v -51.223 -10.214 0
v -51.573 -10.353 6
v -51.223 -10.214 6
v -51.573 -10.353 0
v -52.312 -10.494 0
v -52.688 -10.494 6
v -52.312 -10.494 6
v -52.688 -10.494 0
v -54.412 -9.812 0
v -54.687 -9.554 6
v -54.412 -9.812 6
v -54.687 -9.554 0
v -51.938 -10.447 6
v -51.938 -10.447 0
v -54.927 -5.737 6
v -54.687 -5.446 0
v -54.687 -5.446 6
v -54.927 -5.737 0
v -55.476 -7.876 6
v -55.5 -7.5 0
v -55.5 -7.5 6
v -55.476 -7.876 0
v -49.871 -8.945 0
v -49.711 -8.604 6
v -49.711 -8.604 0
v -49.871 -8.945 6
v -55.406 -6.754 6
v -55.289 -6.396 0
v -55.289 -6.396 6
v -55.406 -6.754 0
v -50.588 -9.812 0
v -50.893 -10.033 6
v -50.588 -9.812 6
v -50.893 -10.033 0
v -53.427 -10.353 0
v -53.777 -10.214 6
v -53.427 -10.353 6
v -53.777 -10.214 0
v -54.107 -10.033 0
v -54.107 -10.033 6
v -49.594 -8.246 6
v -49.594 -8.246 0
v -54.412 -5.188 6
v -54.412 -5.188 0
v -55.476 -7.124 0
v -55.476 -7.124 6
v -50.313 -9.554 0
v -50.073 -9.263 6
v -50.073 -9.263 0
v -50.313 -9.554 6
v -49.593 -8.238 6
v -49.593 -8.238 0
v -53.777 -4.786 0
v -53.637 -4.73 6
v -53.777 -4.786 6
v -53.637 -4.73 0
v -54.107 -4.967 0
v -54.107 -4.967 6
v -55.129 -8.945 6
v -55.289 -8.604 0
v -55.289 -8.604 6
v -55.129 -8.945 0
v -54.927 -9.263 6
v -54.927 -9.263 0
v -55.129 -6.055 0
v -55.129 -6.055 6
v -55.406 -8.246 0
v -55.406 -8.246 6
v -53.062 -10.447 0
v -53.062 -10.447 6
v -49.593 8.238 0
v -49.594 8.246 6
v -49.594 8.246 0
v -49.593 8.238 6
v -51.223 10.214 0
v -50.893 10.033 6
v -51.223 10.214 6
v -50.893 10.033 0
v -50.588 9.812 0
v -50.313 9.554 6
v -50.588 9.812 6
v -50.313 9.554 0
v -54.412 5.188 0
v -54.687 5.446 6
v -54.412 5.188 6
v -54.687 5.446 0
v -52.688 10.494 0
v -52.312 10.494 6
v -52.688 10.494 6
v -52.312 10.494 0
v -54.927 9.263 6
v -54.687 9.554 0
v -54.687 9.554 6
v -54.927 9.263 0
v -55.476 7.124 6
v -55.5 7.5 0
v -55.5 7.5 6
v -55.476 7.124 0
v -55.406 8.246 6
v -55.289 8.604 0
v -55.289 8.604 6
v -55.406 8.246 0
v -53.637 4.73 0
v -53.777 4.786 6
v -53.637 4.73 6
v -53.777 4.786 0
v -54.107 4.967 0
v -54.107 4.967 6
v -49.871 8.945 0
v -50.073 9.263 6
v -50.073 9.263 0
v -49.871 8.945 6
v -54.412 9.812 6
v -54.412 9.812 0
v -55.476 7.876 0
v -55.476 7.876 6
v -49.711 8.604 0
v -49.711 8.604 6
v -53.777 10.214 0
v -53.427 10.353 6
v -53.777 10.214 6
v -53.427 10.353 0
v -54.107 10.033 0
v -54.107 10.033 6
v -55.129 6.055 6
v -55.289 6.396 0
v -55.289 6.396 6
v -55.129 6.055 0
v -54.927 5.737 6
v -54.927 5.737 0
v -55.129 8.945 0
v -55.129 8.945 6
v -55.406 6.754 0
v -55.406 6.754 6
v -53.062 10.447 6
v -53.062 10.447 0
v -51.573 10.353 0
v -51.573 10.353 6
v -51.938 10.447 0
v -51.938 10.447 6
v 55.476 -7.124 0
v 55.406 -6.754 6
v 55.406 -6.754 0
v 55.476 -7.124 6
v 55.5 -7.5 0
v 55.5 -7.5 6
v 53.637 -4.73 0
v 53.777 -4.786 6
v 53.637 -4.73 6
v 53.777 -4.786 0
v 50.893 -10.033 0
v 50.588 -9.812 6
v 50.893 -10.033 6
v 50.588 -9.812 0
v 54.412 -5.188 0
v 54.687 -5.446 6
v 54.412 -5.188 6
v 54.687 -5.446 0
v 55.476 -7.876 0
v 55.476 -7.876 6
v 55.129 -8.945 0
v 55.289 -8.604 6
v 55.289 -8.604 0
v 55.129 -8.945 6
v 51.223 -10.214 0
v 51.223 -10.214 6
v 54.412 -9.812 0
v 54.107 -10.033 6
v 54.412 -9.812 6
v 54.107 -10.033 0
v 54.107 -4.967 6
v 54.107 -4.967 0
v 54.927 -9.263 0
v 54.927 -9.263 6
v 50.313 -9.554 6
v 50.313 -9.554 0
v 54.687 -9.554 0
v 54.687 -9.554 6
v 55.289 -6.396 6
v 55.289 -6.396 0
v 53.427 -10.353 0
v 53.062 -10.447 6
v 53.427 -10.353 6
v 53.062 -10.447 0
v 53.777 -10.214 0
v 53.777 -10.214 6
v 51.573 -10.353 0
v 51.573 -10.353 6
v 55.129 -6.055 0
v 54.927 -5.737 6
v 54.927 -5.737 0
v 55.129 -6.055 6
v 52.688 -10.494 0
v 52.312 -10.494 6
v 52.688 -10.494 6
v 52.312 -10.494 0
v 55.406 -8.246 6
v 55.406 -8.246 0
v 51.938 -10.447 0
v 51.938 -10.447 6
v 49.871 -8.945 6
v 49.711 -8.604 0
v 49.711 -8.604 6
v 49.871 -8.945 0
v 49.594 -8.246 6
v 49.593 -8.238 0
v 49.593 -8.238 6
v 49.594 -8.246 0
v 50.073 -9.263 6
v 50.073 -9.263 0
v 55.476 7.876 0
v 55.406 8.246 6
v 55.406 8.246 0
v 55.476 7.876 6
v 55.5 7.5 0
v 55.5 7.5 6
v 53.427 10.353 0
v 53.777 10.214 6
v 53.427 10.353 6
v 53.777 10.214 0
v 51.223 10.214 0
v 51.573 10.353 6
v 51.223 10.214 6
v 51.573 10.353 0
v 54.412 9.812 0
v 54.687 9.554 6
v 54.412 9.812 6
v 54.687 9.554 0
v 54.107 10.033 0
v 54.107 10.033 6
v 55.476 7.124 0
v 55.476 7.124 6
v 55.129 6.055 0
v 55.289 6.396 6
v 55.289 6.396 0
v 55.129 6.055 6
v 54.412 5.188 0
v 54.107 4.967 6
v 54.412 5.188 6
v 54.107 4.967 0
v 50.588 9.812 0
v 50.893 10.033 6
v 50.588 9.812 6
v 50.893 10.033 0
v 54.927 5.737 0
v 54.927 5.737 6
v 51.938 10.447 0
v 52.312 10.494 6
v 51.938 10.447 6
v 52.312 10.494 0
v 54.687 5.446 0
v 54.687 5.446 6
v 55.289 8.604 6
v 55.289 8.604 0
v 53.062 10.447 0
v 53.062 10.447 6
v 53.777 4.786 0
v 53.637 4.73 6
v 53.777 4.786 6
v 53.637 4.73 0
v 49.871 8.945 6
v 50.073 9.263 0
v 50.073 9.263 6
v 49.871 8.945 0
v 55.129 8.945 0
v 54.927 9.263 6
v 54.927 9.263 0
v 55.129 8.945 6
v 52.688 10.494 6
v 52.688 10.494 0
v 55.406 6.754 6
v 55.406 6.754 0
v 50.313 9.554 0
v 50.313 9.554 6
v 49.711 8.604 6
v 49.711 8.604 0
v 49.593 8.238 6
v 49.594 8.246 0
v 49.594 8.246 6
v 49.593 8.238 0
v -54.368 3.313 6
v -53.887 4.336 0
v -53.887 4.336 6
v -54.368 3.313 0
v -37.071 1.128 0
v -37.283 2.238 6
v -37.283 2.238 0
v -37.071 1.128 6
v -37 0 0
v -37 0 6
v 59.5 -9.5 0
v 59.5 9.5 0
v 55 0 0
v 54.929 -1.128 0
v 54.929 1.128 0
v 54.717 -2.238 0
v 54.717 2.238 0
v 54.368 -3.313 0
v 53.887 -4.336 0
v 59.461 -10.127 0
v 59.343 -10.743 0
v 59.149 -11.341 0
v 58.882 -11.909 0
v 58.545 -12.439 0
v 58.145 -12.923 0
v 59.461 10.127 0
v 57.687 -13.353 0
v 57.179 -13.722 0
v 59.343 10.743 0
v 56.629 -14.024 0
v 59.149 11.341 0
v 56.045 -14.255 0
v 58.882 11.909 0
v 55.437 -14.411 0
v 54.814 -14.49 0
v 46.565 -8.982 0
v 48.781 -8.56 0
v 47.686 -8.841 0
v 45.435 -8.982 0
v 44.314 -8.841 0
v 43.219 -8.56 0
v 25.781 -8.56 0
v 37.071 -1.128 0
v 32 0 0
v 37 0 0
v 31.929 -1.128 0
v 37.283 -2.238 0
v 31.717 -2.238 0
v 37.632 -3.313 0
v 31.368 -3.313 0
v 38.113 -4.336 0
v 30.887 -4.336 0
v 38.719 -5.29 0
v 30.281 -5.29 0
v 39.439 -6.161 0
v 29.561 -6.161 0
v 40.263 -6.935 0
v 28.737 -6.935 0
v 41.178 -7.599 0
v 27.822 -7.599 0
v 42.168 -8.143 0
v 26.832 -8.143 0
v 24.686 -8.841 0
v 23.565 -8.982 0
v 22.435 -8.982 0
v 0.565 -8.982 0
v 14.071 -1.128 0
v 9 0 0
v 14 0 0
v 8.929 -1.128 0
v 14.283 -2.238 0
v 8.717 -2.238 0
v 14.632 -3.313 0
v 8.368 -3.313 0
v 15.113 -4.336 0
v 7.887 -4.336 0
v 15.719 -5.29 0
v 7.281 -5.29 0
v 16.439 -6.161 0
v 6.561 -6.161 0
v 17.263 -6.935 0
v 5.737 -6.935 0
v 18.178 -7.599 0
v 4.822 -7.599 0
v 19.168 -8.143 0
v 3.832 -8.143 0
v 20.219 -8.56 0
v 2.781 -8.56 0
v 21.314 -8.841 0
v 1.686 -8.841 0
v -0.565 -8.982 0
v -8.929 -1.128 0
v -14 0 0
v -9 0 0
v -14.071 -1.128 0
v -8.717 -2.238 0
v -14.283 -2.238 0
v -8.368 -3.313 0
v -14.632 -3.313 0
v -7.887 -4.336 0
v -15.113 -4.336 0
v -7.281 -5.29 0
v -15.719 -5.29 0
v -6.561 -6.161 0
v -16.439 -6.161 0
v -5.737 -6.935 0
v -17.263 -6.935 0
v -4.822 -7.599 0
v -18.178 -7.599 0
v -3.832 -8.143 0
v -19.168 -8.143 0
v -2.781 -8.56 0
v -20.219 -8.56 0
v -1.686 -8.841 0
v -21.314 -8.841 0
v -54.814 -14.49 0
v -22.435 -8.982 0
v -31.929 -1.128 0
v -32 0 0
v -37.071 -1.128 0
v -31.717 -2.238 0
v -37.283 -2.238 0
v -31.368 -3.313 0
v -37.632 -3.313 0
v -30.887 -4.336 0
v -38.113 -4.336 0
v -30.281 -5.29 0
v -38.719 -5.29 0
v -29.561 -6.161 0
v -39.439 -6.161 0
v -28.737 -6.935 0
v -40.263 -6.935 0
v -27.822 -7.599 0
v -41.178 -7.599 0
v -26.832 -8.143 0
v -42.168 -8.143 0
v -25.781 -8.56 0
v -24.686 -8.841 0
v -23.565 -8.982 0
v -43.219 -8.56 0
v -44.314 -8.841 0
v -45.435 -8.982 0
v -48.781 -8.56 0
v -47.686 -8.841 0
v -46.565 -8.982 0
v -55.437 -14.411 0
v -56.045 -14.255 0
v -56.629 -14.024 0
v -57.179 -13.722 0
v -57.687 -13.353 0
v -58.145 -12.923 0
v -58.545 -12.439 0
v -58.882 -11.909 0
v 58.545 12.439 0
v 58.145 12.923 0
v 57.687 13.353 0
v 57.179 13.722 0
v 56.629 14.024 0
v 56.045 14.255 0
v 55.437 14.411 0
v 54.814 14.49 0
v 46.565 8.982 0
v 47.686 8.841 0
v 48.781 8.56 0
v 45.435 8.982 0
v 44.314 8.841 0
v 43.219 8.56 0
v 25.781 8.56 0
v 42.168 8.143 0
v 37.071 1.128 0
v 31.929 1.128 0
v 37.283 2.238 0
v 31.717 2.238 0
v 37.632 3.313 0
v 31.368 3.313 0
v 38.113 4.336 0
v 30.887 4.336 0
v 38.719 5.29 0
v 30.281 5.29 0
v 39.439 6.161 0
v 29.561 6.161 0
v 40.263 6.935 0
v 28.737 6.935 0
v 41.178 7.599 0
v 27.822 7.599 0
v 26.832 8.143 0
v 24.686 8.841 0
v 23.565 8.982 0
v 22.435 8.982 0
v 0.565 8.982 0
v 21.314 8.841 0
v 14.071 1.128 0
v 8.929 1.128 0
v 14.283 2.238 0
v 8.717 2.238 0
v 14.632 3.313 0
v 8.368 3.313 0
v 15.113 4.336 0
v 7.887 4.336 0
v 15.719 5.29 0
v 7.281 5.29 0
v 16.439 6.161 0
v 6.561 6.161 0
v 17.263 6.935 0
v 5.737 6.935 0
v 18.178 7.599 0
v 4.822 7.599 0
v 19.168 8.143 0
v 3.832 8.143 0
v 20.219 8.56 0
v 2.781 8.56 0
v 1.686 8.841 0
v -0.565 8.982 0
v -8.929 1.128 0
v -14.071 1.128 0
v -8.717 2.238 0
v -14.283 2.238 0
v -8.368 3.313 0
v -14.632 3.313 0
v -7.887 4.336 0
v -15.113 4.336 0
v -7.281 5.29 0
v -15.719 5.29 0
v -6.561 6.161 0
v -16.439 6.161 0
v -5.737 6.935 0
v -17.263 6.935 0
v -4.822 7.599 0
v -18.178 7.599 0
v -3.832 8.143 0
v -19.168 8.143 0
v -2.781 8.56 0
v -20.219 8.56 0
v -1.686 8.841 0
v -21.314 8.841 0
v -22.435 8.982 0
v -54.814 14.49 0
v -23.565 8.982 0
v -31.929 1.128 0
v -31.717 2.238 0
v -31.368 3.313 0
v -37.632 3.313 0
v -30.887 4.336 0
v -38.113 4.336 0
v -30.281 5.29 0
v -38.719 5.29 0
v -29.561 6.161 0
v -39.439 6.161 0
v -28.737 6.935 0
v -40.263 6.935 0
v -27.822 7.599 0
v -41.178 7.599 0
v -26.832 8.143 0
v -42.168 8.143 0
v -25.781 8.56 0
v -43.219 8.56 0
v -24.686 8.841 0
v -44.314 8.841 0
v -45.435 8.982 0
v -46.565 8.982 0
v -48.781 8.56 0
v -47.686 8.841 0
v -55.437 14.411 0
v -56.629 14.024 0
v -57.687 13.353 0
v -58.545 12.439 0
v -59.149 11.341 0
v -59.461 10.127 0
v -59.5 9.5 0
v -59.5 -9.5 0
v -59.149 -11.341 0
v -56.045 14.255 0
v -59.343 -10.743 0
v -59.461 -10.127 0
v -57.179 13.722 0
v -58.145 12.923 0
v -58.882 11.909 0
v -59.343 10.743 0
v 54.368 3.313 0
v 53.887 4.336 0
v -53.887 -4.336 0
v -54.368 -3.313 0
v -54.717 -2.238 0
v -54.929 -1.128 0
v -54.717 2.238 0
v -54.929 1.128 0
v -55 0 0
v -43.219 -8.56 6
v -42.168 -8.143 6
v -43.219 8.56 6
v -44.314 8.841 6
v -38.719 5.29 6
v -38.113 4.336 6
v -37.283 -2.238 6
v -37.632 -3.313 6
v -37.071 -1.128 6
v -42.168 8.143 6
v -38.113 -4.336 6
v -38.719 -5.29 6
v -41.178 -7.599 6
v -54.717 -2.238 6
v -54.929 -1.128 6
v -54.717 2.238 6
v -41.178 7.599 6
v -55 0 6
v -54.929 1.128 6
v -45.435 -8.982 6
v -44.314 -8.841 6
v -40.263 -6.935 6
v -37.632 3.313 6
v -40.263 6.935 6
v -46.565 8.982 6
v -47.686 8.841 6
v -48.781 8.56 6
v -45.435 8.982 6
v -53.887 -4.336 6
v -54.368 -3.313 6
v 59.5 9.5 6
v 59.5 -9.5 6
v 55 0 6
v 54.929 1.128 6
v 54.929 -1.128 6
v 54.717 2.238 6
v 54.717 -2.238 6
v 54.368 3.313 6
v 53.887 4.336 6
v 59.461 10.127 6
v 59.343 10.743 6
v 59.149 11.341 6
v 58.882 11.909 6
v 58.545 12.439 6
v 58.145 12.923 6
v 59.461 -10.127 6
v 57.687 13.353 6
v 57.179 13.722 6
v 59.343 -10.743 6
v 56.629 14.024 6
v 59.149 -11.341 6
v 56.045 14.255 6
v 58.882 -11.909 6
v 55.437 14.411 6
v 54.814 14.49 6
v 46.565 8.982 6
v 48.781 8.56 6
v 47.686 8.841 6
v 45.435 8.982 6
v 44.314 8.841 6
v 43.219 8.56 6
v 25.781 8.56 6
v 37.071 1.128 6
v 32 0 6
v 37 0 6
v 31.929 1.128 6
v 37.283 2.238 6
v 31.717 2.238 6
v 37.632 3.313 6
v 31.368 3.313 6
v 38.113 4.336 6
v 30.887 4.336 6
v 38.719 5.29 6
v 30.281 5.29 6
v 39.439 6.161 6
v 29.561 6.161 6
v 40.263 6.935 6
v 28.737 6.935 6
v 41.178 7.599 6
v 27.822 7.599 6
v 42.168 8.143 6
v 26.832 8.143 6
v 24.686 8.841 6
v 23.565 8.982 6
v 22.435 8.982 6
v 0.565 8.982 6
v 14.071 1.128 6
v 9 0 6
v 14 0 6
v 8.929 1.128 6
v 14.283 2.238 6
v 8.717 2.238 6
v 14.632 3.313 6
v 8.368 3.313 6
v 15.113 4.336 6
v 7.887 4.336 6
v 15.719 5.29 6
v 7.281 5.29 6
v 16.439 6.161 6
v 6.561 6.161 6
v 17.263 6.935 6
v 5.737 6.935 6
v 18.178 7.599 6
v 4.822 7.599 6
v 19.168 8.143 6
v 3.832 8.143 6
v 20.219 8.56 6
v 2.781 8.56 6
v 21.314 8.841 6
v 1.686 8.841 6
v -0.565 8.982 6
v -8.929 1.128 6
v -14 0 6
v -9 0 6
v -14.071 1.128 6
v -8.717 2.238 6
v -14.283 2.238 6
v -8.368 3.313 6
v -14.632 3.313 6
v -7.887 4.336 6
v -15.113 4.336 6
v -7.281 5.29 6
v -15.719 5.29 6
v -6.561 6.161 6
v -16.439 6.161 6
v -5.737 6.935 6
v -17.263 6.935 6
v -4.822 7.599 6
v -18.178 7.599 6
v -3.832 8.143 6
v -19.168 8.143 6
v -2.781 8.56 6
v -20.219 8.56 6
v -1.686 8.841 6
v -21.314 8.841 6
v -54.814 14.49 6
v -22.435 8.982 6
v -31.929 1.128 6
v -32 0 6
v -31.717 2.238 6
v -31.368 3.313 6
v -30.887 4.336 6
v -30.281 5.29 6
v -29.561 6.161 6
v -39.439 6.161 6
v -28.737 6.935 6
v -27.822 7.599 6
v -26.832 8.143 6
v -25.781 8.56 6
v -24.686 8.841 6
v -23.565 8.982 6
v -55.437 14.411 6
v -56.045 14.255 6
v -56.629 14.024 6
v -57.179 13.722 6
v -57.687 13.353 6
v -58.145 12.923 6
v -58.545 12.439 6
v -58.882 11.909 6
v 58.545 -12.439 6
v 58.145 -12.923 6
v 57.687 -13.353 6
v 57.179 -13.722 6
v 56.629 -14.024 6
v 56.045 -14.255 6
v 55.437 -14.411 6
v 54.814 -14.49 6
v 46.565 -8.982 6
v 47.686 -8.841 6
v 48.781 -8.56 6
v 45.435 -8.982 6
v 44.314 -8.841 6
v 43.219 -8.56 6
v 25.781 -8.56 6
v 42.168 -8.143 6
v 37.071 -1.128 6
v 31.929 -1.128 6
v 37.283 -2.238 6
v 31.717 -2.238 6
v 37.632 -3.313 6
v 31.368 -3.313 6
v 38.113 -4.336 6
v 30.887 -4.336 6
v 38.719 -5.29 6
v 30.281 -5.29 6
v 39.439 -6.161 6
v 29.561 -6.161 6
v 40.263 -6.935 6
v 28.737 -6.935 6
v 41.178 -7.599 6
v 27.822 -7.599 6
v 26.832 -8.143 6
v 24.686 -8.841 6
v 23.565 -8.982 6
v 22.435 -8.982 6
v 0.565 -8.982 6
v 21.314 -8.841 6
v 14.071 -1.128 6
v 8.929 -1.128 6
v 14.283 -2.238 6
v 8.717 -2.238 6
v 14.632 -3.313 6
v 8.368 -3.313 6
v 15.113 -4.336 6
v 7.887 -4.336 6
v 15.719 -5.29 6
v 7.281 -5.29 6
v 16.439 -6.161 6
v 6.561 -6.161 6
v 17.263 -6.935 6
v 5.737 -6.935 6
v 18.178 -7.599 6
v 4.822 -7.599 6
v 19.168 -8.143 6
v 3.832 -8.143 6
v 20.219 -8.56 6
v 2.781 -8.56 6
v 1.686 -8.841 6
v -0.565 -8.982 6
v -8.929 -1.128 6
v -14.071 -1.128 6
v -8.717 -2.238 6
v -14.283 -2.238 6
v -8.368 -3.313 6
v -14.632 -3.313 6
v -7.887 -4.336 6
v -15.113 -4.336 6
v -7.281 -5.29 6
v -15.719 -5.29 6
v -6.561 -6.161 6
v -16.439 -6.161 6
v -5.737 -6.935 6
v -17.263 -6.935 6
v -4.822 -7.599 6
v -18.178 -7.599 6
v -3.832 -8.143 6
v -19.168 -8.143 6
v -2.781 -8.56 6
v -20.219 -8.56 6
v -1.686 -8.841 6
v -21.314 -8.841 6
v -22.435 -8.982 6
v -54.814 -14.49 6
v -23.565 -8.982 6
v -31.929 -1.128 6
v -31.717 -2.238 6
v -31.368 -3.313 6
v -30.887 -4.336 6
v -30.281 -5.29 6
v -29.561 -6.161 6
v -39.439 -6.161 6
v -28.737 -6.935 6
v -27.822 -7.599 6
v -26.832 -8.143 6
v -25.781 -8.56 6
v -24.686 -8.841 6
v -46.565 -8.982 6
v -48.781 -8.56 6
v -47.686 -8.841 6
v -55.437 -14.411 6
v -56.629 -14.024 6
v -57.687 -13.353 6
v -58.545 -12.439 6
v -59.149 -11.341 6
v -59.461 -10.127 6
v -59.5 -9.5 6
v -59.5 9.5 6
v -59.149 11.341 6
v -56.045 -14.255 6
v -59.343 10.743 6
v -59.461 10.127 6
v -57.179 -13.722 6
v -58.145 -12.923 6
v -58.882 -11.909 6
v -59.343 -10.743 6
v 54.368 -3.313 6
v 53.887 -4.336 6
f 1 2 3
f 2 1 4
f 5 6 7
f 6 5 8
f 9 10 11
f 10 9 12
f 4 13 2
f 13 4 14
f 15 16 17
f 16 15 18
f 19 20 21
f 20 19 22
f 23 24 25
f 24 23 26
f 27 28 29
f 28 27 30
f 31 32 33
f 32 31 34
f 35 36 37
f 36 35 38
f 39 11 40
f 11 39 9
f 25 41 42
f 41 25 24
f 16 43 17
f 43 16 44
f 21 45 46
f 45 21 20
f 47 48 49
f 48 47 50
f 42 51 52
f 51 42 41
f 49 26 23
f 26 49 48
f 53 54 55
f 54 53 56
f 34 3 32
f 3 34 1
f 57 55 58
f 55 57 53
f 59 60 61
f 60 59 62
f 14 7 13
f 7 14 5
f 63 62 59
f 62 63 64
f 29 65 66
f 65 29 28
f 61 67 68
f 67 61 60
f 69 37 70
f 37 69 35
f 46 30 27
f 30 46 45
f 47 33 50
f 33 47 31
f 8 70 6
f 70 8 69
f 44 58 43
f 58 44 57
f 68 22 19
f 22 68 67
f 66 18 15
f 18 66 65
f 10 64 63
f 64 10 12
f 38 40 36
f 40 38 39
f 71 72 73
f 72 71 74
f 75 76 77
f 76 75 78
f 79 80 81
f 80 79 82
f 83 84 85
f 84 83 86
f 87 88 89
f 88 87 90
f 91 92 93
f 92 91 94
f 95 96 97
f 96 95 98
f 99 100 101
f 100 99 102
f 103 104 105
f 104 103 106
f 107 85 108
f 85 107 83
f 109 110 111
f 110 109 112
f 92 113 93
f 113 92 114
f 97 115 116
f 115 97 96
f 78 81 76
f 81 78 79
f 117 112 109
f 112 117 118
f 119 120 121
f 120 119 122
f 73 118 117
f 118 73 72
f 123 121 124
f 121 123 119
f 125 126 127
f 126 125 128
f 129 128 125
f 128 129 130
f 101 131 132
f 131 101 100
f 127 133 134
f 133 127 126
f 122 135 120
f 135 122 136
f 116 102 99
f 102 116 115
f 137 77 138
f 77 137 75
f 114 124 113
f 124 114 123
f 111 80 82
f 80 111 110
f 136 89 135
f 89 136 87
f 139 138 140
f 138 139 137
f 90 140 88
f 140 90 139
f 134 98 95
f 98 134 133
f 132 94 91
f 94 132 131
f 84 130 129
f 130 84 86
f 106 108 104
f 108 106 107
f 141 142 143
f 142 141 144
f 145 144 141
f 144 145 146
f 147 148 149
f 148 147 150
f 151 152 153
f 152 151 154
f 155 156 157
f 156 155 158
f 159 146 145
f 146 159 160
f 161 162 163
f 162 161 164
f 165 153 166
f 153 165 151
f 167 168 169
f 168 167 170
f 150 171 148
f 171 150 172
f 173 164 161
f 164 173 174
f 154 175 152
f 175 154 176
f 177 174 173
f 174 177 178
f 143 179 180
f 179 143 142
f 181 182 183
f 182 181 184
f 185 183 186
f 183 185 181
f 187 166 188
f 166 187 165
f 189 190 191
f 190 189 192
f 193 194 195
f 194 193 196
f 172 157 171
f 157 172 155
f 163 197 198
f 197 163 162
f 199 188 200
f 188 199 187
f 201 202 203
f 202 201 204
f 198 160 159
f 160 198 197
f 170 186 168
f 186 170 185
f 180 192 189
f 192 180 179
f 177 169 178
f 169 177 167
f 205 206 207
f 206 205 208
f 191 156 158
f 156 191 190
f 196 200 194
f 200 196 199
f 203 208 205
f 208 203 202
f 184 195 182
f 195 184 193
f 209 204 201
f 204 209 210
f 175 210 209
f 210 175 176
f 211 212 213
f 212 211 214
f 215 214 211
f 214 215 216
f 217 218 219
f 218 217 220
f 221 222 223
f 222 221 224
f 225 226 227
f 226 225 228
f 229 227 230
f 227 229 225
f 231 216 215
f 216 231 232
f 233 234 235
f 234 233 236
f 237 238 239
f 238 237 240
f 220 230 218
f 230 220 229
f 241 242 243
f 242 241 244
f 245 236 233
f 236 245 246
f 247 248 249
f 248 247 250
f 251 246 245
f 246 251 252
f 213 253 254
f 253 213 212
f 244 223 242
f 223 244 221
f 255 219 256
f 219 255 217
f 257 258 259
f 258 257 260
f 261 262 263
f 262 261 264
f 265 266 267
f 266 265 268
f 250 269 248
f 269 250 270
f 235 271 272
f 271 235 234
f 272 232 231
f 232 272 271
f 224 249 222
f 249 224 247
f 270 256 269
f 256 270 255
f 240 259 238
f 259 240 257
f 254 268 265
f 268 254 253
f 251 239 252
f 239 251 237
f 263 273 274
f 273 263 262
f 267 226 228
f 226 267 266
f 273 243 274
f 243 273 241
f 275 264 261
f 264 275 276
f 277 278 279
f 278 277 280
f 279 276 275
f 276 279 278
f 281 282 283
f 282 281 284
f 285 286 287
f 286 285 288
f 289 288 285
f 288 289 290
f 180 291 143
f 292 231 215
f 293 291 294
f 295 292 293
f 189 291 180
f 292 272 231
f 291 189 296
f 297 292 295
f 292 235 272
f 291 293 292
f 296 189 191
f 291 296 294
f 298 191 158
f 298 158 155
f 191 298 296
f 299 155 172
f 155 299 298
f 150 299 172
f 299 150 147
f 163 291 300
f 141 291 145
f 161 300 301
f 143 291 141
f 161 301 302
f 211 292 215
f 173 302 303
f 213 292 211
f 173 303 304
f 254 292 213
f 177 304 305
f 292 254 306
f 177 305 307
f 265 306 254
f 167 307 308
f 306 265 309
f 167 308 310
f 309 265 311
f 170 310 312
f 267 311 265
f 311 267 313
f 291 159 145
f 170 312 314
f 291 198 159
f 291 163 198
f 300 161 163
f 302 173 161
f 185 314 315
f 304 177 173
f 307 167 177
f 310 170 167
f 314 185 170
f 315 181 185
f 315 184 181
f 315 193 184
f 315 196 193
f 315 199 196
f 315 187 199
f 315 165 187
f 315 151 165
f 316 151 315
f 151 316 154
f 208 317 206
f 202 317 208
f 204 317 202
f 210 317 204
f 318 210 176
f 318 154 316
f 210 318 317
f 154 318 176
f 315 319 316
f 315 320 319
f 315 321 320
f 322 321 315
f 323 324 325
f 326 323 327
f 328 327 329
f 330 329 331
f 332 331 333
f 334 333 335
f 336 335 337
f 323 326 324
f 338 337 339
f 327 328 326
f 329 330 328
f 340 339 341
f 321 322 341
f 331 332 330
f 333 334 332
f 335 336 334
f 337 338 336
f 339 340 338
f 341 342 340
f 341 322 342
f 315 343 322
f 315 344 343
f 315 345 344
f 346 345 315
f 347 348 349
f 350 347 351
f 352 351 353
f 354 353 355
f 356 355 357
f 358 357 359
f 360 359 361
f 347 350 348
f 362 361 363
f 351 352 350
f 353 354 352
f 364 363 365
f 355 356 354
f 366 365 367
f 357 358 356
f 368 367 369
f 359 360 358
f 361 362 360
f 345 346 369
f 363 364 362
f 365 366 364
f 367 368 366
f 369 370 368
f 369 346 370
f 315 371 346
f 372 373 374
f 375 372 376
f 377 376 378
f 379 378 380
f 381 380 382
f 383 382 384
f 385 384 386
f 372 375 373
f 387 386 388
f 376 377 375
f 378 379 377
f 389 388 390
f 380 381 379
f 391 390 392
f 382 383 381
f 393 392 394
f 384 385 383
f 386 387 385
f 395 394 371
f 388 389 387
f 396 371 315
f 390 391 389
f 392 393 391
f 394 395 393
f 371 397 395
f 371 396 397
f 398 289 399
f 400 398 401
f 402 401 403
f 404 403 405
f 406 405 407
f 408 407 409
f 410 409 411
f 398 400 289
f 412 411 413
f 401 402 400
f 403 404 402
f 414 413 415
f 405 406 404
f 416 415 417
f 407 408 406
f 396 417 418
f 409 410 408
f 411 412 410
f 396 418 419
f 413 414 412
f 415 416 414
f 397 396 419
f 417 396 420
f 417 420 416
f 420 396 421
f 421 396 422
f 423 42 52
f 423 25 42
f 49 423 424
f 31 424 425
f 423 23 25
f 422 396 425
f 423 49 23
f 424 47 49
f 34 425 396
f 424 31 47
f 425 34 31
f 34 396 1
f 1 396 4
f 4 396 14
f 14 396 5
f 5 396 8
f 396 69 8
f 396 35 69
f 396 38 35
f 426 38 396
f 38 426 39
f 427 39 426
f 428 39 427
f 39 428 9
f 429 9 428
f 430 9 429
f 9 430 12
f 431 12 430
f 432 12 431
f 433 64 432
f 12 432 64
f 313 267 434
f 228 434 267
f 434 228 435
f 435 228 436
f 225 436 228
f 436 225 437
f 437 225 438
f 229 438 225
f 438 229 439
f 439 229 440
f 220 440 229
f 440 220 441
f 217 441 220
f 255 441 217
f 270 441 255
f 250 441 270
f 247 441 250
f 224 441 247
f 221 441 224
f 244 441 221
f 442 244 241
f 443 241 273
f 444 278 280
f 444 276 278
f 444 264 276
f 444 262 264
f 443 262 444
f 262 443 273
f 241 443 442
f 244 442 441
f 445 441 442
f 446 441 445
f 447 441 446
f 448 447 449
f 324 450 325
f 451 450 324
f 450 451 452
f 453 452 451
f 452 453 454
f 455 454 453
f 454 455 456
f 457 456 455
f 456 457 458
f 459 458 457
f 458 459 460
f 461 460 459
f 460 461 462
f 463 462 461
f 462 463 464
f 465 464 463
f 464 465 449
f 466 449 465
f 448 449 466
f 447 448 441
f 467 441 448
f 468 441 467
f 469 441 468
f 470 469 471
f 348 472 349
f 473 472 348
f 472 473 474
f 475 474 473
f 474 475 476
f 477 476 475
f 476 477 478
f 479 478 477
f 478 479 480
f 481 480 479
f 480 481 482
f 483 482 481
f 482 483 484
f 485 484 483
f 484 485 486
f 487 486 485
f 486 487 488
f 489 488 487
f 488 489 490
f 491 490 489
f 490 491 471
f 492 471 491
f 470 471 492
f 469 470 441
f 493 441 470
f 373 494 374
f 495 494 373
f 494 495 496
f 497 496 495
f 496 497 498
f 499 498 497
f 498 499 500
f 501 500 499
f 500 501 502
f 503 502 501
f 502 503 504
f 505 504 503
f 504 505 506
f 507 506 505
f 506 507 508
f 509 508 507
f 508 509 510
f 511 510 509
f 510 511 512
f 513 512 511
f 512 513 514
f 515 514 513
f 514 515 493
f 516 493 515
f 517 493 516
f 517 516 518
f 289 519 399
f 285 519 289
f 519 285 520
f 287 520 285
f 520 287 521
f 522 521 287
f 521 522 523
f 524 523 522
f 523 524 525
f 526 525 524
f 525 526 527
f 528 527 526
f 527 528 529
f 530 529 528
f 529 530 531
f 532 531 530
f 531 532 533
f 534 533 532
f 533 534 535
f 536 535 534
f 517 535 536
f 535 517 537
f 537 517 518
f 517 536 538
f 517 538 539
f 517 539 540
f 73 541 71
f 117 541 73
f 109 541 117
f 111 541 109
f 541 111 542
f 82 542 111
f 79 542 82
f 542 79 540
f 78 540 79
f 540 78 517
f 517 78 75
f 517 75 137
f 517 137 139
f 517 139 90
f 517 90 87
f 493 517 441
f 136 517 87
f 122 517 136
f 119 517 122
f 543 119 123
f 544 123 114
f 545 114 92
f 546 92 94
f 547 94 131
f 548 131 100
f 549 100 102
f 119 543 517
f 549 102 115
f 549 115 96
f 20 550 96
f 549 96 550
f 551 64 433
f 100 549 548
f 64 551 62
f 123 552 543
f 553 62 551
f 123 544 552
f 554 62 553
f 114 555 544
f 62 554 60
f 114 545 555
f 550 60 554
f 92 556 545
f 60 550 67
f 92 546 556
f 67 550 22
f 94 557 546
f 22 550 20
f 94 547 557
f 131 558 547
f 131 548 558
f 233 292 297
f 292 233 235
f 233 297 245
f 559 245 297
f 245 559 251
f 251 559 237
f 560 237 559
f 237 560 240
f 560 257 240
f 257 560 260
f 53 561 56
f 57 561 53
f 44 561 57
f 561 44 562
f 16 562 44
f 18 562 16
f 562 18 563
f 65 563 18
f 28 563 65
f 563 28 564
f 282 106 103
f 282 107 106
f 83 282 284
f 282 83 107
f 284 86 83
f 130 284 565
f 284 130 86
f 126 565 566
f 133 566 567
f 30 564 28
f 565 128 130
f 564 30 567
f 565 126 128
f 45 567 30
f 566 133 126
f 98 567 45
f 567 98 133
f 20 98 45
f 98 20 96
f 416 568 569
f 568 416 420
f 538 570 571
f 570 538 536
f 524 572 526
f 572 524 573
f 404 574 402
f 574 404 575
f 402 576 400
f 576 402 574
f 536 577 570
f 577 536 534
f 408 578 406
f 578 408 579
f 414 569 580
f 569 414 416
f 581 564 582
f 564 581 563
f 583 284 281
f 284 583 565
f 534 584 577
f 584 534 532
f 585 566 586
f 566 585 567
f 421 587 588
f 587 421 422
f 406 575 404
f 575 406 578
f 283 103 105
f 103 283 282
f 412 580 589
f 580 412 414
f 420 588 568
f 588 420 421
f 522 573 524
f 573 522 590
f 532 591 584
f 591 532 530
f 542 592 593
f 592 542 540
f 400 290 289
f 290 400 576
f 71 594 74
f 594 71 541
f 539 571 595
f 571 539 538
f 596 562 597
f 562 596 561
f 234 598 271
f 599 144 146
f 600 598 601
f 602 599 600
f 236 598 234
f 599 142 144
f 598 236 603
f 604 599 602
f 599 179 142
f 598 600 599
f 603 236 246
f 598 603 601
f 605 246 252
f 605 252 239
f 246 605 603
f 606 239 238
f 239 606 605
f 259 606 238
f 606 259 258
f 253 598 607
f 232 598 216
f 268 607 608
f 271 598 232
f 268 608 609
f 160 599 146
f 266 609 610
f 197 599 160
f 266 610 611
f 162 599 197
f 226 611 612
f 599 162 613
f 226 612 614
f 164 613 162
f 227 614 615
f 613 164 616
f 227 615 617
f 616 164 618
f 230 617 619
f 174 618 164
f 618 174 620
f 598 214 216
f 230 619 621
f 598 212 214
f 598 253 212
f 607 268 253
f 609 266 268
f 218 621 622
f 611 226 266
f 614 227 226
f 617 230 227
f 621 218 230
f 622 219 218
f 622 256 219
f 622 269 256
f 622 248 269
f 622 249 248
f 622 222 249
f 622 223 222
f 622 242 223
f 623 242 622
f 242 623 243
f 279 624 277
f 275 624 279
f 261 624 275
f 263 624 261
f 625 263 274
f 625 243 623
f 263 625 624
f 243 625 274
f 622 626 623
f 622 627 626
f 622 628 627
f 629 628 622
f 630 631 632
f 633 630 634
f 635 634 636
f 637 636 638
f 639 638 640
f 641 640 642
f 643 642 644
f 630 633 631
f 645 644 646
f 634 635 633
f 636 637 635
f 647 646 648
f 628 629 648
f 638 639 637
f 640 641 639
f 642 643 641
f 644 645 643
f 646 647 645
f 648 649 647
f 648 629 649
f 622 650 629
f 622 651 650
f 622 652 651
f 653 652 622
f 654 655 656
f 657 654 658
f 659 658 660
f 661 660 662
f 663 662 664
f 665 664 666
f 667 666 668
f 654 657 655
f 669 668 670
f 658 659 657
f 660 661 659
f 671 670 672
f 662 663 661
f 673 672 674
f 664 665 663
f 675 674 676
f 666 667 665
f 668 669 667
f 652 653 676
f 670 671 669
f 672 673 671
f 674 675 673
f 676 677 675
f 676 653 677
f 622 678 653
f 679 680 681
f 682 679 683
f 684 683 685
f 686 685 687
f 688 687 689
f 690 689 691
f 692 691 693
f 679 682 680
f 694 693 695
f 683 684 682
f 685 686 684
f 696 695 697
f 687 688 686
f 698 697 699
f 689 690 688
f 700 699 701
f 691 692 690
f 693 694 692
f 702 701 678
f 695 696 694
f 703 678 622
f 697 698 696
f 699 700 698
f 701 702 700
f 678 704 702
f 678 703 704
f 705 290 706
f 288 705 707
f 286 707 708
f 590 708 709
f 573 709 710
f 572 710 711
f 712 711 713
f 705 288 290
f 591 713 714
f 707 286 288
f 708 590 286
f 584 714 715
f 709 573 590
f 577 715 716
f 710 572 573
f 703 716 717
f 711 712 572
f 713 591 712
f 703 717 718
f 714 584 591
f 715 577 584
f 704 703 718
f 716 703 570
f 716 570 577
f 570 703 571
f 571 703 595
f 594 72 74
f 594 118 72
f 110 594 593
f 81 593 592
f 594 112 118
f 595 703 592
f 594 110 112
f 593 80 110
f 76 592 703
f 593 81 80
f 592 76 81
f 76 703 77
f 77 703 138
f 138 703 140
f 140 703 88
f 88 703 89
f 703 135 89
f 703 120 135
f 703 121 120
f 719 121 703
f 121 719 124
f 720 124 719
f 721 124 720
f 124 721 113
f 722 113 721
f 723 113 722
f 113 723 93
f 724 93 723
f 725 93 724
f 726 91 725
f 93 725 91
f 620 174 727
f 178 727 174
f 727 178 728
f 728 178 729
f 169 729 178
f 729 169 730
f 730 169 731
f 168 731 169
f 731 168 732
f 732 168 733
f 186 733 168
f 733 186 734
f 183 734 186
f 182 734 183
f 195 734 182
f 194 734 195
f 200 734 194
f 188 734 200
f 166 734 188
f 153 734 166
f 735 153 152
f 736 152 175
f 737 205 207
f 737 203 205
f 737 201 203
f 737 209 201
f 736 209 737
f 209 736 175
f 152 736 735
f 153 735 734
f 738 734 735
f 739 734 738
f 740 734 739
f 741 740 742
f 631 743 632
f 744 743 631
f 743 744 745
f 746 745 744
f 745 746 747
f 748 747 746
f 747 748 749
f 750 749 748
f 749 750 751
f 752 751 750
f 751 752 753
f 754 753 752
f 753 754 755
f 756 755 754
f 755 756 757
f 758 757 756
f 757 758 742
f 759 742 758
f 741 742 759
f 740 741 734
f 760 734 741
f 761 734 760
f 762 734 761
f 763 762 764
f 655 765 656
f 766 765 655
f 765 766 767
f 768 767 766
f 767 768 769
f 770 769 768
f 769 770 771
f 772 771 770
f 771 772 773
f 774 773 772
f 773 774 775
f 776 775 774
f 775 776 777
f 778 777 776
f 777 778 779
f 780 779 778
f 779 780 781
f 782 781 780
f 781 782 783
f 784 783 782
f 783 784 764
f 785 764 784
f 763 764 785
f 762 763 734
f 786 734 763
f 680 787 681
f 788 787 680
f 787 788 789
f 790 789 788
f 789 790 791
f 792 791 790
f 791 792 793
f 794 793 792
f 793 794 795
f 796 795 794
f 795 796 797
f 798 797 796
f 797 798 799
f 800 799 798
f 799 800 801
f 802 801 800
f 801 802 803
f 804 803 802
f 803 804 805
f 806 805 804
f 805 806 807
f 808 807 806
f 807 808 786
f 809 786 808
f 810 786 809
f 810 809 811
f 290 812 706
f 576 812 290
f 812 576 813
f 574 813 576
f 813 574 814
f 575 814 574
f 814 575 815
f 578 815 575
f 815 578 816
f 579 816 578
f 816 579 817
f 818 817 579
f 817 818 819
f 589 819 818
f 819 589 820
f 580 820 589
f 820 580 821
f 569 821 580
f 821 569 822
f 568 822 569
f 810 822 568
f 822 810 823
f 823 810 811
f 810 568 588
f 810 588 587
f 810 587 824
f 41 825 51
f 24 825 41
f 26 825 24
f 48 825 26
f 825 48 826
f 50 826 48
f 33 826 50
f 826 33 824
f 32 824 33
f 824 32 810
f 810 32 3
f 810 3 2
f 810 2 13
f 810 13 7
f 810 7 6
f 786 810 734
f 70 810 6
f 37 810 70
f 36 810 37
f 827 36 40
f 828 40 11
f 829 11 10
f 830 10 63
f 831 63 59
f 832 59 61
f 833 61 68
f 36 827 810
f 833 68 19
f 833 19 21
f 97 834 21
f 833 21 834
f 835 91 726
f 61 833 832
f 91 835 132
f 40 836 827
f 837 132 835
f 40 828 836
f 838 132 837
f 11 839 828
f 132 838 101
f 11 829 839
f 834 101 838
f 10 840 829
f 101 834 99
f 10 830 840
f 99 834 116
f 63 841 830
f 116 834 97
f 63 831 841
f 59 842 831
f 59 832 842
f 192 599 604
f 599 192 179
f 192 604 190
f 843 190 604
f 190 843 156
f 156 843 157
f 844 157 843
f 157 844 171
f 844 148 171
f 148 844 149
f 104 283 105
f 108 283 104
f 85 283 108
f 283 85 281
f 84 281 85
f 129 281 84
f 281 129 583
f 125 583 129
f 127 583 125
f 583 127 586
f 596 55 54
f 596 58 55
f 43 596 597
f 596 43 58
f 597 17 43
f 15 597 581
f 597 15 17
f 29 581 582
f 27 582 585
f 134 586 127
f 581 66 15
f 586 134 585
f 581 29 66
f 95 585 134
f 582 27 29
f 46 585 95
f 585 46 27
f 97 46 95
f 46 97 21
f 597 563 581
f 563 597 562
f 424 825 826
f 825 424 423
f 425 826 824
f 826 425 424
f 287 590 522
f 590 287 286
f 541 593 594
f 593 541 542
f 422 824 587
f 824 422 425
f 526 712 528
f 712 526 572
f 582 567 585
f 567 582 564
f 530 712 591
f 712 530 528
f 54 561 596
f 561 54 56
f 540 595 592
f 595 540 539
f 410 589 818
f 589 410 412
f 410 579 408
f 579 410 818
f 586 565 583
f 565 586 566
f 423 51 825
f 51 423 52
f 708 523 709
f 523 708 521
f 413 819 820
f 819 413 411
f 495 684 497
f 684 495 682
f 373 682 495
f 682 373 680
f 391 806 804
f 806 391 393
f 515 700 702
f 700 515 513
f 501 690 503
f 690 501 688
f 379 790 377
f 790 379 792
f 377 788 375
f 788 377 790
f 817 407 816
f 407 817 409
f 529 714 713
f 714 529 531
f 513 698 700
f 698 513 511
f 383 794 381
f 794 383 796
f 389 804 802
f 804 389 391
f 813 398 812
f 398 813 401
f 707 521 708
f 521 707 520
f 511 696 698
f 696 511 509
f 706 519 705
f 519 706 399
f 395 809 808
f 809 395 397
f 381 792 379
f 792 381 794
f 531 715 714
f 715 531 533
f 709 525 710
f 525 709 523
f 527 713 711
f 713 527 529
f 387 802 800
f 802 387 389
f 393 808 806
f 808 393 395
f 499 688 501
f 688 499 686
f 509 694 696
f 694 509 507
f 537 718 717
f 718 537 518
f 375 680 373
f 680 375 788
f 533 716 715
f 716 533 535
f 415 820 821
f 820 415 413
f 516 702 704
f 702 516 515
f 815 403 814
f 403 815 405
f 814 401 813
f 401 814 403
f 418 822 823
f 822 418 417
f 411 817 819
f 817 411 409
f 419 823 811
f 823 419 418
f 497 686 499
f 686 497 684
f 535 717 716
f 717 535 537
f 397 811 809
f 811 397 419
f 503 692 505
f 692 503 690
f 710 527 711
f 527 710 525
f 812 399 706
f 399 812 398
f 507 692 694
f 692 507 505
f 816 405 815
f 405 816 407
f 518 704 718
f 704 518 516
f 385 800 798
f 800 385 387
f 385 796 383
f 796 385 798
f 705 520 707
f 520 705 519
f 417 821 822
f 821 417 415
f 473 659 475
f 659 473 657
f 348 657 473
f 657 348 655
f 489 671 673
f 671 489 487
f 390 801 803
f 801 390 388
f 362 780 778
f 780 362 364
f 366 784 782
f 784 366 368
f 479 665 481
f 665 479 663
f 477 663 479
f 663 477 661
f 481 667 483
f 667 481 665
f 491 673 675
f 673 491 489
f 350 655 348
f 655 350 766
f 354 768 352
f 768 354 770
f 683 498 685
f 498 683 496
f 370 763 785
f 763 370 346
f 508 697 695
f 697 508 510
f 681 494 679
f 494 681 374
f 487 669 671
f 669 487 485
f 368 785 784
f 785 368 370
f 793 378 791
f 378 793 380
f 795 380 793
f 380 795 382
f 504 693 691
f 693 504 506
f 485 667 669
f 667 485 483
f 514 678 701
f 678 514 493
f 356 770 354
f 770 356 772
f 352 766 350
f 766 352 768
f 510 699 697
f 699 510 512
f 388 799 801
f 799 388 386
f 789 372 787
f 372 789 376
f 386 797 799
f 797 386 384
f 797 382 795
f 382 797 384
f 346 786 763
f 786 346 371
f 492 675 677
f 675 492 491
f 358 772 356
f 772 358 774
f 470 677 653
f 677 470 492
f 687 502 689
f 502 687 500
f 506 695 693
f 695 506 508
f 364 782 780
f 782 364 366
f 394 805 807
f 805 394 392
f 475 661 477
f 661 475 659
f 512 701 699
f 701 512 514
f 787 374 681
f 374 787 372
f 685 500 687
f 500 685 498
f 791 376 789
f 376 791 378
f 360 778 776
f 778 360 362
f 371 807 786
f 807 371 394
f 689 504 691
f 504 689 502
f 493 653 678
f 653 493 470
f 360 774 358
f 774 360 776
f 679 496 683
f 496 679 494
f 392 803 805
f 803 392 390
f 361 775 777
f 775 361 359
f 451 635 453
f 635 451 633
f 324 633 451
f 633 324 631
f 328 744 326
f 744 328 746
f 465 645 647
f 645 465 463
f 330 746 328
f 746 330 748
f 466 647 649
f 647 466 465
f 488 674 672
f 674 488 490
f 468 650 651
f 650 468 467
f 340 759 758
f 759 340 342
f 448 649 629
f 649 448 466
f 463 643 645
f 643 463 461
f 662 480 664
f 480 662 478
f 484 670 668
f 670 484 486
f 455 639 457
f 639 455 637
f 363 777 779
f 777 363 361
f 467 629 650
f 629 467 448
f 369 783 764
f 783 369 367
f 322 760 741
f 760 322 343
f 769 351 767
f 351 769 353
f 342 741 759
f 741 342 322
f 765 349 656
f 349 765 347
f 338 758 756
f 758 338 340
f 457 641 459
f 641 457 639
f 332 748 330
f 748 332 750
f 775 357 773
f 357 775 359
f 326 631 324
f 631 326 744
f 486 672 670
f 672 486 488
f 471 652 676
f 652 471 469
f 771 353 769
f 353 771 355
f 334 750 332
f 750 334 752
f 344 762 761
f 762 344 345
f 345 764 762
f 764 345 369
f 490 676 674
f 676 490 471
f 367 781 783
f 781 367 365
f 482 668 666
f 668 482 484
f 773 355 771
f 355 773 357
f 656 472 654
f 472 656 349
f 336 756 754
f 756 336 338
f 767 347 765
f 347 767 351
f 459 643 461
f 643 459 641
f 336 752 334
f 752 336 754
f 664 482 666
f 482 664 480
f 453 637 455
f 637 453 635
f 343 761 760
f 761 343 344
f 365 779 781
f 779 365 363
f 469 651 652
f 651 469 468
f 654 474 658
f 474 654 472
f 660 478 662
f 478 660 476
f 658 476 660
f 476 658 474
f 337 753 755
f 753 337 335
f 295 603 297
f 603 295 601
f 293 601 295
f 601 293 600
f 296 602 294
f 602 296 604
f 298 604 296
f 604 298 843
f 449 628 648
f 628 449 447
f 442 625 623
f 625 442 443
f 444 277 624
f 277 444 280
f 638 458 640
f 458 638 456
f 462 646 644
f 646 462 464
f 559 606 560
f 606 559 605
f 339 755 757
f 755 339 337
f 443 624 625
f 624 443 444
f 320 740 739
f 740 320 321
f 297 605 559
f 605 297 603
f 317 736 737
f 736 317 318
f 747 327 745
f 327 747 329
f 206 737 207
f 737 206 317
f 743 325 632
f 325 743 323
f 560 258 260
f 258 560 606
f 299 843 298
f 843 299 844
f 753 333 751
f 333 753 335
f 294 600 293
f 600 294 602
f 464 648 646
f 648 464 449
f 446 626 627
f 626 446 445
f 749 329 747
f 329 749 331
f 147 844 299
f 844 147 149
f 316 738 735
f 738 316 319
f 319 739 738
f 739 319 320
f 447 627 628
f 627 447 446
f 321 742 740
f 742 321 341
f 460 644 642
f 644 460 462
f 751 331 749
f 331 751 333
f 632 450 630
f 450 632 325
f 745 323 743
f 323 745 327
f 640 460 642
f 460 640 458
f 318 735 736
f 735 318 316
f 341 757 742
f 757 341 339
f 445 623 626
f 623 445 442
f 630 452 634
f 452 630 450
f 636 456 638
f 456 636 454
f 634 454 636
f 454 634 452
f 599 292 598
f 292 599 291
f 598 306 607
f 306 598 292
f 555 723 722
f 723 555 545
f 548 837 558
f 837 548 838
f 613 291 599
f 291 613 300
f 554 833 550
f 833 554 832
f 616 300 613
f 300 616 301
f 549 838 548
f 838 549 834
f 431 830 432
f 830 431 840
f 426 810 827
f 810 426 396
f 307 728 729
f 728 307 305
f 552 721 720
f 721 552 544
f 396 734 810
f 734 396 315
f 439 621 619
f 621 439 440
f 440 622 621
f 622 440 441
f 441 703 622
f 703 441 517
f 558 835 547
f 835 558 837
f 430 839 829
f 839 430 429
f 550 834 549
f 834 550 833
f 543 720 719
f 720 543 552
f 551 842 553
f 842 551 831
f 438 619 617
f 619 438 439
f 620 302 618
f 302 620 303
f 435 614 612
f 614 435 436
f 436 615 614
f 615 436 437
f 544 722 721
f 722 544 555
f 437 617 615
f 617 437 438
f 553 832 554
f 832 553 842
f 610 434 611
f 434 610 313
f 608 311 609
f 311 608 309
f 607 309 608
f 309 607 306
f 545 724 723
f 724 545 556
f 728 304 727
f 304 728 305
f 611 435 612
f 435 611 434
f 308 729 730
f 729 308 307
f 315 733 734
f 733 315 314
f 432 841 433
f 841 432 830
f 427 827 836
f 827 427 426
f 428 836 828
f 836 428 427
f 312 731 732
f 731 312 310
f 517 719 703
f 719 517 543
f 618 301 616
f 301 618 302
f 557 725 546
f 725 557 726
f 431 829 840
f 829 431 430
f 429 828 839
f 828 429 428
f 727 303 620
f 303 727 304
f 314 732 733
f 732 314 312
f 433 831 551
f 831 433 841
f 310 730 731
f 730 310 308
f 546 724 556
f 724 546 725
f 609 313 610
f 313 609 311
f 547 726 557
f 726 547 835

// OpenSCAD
$fn = 50;


difference() {
	union() {
		hull() {
			translate(v = [-54.5000000000, 9.5000000000, 0]) {
				cylinder(h = 6, r = 5);
			}
			translate(v = [54.5000000000, 9.5000000000, 0]) {
				cylinder(h = 6, r = 5);
			}
			translate(v = [-54.5000000000, -9.5000000000, 0]) {
				cylinder(h = 6, r = 5);
			}
			translate(v = [54.5000000000, -9.5000000000, 0]) {
				cylinder(h = 6, r = 5);
			}
		}
	}
	union() {
		#translate(v = [-52.5000000000, -7.5000000000, -100.0000000000]) {
			cylinder(h = 200, r = 3.0000000000);
		}
		#translate(v = [-52.5000000000, 7.5000000000, -100.0000000000]) {
			cylinder(h = 200, r = 3.0000000000);
		}
		#translate(v = [52.5000000000, -7.5000000000, -100.0000000000]) {
			cylinder(h = 200, r = 3.0000000000);
		}
		#translate(v = [52.5000000000, 7.5000000000, -100.0000000000]) {
			cylinder(h = 200, r = 3.0000000000);
		}
		#translate(v = [-46.0000000000, 0, 0]) {
			cylinder(h = 6, r = 9.0000000000);
		}
		#translate(v = [-23.0000000000, 0, 0]) {
			cylinder(h = 6, r = 9.0000000000);
		}
		#cylinder(h = 6, r = 9.0000000000);
		#translate(v = [23.0000000000, 0, 0]) {
			cylinder(h = 6, r = 9.0000000000);
		}
		#translate(v = [46.0000000000, 0, 0]) {
			cylinder(h = 6, r = 9.0000000000);
		}
	}
}
